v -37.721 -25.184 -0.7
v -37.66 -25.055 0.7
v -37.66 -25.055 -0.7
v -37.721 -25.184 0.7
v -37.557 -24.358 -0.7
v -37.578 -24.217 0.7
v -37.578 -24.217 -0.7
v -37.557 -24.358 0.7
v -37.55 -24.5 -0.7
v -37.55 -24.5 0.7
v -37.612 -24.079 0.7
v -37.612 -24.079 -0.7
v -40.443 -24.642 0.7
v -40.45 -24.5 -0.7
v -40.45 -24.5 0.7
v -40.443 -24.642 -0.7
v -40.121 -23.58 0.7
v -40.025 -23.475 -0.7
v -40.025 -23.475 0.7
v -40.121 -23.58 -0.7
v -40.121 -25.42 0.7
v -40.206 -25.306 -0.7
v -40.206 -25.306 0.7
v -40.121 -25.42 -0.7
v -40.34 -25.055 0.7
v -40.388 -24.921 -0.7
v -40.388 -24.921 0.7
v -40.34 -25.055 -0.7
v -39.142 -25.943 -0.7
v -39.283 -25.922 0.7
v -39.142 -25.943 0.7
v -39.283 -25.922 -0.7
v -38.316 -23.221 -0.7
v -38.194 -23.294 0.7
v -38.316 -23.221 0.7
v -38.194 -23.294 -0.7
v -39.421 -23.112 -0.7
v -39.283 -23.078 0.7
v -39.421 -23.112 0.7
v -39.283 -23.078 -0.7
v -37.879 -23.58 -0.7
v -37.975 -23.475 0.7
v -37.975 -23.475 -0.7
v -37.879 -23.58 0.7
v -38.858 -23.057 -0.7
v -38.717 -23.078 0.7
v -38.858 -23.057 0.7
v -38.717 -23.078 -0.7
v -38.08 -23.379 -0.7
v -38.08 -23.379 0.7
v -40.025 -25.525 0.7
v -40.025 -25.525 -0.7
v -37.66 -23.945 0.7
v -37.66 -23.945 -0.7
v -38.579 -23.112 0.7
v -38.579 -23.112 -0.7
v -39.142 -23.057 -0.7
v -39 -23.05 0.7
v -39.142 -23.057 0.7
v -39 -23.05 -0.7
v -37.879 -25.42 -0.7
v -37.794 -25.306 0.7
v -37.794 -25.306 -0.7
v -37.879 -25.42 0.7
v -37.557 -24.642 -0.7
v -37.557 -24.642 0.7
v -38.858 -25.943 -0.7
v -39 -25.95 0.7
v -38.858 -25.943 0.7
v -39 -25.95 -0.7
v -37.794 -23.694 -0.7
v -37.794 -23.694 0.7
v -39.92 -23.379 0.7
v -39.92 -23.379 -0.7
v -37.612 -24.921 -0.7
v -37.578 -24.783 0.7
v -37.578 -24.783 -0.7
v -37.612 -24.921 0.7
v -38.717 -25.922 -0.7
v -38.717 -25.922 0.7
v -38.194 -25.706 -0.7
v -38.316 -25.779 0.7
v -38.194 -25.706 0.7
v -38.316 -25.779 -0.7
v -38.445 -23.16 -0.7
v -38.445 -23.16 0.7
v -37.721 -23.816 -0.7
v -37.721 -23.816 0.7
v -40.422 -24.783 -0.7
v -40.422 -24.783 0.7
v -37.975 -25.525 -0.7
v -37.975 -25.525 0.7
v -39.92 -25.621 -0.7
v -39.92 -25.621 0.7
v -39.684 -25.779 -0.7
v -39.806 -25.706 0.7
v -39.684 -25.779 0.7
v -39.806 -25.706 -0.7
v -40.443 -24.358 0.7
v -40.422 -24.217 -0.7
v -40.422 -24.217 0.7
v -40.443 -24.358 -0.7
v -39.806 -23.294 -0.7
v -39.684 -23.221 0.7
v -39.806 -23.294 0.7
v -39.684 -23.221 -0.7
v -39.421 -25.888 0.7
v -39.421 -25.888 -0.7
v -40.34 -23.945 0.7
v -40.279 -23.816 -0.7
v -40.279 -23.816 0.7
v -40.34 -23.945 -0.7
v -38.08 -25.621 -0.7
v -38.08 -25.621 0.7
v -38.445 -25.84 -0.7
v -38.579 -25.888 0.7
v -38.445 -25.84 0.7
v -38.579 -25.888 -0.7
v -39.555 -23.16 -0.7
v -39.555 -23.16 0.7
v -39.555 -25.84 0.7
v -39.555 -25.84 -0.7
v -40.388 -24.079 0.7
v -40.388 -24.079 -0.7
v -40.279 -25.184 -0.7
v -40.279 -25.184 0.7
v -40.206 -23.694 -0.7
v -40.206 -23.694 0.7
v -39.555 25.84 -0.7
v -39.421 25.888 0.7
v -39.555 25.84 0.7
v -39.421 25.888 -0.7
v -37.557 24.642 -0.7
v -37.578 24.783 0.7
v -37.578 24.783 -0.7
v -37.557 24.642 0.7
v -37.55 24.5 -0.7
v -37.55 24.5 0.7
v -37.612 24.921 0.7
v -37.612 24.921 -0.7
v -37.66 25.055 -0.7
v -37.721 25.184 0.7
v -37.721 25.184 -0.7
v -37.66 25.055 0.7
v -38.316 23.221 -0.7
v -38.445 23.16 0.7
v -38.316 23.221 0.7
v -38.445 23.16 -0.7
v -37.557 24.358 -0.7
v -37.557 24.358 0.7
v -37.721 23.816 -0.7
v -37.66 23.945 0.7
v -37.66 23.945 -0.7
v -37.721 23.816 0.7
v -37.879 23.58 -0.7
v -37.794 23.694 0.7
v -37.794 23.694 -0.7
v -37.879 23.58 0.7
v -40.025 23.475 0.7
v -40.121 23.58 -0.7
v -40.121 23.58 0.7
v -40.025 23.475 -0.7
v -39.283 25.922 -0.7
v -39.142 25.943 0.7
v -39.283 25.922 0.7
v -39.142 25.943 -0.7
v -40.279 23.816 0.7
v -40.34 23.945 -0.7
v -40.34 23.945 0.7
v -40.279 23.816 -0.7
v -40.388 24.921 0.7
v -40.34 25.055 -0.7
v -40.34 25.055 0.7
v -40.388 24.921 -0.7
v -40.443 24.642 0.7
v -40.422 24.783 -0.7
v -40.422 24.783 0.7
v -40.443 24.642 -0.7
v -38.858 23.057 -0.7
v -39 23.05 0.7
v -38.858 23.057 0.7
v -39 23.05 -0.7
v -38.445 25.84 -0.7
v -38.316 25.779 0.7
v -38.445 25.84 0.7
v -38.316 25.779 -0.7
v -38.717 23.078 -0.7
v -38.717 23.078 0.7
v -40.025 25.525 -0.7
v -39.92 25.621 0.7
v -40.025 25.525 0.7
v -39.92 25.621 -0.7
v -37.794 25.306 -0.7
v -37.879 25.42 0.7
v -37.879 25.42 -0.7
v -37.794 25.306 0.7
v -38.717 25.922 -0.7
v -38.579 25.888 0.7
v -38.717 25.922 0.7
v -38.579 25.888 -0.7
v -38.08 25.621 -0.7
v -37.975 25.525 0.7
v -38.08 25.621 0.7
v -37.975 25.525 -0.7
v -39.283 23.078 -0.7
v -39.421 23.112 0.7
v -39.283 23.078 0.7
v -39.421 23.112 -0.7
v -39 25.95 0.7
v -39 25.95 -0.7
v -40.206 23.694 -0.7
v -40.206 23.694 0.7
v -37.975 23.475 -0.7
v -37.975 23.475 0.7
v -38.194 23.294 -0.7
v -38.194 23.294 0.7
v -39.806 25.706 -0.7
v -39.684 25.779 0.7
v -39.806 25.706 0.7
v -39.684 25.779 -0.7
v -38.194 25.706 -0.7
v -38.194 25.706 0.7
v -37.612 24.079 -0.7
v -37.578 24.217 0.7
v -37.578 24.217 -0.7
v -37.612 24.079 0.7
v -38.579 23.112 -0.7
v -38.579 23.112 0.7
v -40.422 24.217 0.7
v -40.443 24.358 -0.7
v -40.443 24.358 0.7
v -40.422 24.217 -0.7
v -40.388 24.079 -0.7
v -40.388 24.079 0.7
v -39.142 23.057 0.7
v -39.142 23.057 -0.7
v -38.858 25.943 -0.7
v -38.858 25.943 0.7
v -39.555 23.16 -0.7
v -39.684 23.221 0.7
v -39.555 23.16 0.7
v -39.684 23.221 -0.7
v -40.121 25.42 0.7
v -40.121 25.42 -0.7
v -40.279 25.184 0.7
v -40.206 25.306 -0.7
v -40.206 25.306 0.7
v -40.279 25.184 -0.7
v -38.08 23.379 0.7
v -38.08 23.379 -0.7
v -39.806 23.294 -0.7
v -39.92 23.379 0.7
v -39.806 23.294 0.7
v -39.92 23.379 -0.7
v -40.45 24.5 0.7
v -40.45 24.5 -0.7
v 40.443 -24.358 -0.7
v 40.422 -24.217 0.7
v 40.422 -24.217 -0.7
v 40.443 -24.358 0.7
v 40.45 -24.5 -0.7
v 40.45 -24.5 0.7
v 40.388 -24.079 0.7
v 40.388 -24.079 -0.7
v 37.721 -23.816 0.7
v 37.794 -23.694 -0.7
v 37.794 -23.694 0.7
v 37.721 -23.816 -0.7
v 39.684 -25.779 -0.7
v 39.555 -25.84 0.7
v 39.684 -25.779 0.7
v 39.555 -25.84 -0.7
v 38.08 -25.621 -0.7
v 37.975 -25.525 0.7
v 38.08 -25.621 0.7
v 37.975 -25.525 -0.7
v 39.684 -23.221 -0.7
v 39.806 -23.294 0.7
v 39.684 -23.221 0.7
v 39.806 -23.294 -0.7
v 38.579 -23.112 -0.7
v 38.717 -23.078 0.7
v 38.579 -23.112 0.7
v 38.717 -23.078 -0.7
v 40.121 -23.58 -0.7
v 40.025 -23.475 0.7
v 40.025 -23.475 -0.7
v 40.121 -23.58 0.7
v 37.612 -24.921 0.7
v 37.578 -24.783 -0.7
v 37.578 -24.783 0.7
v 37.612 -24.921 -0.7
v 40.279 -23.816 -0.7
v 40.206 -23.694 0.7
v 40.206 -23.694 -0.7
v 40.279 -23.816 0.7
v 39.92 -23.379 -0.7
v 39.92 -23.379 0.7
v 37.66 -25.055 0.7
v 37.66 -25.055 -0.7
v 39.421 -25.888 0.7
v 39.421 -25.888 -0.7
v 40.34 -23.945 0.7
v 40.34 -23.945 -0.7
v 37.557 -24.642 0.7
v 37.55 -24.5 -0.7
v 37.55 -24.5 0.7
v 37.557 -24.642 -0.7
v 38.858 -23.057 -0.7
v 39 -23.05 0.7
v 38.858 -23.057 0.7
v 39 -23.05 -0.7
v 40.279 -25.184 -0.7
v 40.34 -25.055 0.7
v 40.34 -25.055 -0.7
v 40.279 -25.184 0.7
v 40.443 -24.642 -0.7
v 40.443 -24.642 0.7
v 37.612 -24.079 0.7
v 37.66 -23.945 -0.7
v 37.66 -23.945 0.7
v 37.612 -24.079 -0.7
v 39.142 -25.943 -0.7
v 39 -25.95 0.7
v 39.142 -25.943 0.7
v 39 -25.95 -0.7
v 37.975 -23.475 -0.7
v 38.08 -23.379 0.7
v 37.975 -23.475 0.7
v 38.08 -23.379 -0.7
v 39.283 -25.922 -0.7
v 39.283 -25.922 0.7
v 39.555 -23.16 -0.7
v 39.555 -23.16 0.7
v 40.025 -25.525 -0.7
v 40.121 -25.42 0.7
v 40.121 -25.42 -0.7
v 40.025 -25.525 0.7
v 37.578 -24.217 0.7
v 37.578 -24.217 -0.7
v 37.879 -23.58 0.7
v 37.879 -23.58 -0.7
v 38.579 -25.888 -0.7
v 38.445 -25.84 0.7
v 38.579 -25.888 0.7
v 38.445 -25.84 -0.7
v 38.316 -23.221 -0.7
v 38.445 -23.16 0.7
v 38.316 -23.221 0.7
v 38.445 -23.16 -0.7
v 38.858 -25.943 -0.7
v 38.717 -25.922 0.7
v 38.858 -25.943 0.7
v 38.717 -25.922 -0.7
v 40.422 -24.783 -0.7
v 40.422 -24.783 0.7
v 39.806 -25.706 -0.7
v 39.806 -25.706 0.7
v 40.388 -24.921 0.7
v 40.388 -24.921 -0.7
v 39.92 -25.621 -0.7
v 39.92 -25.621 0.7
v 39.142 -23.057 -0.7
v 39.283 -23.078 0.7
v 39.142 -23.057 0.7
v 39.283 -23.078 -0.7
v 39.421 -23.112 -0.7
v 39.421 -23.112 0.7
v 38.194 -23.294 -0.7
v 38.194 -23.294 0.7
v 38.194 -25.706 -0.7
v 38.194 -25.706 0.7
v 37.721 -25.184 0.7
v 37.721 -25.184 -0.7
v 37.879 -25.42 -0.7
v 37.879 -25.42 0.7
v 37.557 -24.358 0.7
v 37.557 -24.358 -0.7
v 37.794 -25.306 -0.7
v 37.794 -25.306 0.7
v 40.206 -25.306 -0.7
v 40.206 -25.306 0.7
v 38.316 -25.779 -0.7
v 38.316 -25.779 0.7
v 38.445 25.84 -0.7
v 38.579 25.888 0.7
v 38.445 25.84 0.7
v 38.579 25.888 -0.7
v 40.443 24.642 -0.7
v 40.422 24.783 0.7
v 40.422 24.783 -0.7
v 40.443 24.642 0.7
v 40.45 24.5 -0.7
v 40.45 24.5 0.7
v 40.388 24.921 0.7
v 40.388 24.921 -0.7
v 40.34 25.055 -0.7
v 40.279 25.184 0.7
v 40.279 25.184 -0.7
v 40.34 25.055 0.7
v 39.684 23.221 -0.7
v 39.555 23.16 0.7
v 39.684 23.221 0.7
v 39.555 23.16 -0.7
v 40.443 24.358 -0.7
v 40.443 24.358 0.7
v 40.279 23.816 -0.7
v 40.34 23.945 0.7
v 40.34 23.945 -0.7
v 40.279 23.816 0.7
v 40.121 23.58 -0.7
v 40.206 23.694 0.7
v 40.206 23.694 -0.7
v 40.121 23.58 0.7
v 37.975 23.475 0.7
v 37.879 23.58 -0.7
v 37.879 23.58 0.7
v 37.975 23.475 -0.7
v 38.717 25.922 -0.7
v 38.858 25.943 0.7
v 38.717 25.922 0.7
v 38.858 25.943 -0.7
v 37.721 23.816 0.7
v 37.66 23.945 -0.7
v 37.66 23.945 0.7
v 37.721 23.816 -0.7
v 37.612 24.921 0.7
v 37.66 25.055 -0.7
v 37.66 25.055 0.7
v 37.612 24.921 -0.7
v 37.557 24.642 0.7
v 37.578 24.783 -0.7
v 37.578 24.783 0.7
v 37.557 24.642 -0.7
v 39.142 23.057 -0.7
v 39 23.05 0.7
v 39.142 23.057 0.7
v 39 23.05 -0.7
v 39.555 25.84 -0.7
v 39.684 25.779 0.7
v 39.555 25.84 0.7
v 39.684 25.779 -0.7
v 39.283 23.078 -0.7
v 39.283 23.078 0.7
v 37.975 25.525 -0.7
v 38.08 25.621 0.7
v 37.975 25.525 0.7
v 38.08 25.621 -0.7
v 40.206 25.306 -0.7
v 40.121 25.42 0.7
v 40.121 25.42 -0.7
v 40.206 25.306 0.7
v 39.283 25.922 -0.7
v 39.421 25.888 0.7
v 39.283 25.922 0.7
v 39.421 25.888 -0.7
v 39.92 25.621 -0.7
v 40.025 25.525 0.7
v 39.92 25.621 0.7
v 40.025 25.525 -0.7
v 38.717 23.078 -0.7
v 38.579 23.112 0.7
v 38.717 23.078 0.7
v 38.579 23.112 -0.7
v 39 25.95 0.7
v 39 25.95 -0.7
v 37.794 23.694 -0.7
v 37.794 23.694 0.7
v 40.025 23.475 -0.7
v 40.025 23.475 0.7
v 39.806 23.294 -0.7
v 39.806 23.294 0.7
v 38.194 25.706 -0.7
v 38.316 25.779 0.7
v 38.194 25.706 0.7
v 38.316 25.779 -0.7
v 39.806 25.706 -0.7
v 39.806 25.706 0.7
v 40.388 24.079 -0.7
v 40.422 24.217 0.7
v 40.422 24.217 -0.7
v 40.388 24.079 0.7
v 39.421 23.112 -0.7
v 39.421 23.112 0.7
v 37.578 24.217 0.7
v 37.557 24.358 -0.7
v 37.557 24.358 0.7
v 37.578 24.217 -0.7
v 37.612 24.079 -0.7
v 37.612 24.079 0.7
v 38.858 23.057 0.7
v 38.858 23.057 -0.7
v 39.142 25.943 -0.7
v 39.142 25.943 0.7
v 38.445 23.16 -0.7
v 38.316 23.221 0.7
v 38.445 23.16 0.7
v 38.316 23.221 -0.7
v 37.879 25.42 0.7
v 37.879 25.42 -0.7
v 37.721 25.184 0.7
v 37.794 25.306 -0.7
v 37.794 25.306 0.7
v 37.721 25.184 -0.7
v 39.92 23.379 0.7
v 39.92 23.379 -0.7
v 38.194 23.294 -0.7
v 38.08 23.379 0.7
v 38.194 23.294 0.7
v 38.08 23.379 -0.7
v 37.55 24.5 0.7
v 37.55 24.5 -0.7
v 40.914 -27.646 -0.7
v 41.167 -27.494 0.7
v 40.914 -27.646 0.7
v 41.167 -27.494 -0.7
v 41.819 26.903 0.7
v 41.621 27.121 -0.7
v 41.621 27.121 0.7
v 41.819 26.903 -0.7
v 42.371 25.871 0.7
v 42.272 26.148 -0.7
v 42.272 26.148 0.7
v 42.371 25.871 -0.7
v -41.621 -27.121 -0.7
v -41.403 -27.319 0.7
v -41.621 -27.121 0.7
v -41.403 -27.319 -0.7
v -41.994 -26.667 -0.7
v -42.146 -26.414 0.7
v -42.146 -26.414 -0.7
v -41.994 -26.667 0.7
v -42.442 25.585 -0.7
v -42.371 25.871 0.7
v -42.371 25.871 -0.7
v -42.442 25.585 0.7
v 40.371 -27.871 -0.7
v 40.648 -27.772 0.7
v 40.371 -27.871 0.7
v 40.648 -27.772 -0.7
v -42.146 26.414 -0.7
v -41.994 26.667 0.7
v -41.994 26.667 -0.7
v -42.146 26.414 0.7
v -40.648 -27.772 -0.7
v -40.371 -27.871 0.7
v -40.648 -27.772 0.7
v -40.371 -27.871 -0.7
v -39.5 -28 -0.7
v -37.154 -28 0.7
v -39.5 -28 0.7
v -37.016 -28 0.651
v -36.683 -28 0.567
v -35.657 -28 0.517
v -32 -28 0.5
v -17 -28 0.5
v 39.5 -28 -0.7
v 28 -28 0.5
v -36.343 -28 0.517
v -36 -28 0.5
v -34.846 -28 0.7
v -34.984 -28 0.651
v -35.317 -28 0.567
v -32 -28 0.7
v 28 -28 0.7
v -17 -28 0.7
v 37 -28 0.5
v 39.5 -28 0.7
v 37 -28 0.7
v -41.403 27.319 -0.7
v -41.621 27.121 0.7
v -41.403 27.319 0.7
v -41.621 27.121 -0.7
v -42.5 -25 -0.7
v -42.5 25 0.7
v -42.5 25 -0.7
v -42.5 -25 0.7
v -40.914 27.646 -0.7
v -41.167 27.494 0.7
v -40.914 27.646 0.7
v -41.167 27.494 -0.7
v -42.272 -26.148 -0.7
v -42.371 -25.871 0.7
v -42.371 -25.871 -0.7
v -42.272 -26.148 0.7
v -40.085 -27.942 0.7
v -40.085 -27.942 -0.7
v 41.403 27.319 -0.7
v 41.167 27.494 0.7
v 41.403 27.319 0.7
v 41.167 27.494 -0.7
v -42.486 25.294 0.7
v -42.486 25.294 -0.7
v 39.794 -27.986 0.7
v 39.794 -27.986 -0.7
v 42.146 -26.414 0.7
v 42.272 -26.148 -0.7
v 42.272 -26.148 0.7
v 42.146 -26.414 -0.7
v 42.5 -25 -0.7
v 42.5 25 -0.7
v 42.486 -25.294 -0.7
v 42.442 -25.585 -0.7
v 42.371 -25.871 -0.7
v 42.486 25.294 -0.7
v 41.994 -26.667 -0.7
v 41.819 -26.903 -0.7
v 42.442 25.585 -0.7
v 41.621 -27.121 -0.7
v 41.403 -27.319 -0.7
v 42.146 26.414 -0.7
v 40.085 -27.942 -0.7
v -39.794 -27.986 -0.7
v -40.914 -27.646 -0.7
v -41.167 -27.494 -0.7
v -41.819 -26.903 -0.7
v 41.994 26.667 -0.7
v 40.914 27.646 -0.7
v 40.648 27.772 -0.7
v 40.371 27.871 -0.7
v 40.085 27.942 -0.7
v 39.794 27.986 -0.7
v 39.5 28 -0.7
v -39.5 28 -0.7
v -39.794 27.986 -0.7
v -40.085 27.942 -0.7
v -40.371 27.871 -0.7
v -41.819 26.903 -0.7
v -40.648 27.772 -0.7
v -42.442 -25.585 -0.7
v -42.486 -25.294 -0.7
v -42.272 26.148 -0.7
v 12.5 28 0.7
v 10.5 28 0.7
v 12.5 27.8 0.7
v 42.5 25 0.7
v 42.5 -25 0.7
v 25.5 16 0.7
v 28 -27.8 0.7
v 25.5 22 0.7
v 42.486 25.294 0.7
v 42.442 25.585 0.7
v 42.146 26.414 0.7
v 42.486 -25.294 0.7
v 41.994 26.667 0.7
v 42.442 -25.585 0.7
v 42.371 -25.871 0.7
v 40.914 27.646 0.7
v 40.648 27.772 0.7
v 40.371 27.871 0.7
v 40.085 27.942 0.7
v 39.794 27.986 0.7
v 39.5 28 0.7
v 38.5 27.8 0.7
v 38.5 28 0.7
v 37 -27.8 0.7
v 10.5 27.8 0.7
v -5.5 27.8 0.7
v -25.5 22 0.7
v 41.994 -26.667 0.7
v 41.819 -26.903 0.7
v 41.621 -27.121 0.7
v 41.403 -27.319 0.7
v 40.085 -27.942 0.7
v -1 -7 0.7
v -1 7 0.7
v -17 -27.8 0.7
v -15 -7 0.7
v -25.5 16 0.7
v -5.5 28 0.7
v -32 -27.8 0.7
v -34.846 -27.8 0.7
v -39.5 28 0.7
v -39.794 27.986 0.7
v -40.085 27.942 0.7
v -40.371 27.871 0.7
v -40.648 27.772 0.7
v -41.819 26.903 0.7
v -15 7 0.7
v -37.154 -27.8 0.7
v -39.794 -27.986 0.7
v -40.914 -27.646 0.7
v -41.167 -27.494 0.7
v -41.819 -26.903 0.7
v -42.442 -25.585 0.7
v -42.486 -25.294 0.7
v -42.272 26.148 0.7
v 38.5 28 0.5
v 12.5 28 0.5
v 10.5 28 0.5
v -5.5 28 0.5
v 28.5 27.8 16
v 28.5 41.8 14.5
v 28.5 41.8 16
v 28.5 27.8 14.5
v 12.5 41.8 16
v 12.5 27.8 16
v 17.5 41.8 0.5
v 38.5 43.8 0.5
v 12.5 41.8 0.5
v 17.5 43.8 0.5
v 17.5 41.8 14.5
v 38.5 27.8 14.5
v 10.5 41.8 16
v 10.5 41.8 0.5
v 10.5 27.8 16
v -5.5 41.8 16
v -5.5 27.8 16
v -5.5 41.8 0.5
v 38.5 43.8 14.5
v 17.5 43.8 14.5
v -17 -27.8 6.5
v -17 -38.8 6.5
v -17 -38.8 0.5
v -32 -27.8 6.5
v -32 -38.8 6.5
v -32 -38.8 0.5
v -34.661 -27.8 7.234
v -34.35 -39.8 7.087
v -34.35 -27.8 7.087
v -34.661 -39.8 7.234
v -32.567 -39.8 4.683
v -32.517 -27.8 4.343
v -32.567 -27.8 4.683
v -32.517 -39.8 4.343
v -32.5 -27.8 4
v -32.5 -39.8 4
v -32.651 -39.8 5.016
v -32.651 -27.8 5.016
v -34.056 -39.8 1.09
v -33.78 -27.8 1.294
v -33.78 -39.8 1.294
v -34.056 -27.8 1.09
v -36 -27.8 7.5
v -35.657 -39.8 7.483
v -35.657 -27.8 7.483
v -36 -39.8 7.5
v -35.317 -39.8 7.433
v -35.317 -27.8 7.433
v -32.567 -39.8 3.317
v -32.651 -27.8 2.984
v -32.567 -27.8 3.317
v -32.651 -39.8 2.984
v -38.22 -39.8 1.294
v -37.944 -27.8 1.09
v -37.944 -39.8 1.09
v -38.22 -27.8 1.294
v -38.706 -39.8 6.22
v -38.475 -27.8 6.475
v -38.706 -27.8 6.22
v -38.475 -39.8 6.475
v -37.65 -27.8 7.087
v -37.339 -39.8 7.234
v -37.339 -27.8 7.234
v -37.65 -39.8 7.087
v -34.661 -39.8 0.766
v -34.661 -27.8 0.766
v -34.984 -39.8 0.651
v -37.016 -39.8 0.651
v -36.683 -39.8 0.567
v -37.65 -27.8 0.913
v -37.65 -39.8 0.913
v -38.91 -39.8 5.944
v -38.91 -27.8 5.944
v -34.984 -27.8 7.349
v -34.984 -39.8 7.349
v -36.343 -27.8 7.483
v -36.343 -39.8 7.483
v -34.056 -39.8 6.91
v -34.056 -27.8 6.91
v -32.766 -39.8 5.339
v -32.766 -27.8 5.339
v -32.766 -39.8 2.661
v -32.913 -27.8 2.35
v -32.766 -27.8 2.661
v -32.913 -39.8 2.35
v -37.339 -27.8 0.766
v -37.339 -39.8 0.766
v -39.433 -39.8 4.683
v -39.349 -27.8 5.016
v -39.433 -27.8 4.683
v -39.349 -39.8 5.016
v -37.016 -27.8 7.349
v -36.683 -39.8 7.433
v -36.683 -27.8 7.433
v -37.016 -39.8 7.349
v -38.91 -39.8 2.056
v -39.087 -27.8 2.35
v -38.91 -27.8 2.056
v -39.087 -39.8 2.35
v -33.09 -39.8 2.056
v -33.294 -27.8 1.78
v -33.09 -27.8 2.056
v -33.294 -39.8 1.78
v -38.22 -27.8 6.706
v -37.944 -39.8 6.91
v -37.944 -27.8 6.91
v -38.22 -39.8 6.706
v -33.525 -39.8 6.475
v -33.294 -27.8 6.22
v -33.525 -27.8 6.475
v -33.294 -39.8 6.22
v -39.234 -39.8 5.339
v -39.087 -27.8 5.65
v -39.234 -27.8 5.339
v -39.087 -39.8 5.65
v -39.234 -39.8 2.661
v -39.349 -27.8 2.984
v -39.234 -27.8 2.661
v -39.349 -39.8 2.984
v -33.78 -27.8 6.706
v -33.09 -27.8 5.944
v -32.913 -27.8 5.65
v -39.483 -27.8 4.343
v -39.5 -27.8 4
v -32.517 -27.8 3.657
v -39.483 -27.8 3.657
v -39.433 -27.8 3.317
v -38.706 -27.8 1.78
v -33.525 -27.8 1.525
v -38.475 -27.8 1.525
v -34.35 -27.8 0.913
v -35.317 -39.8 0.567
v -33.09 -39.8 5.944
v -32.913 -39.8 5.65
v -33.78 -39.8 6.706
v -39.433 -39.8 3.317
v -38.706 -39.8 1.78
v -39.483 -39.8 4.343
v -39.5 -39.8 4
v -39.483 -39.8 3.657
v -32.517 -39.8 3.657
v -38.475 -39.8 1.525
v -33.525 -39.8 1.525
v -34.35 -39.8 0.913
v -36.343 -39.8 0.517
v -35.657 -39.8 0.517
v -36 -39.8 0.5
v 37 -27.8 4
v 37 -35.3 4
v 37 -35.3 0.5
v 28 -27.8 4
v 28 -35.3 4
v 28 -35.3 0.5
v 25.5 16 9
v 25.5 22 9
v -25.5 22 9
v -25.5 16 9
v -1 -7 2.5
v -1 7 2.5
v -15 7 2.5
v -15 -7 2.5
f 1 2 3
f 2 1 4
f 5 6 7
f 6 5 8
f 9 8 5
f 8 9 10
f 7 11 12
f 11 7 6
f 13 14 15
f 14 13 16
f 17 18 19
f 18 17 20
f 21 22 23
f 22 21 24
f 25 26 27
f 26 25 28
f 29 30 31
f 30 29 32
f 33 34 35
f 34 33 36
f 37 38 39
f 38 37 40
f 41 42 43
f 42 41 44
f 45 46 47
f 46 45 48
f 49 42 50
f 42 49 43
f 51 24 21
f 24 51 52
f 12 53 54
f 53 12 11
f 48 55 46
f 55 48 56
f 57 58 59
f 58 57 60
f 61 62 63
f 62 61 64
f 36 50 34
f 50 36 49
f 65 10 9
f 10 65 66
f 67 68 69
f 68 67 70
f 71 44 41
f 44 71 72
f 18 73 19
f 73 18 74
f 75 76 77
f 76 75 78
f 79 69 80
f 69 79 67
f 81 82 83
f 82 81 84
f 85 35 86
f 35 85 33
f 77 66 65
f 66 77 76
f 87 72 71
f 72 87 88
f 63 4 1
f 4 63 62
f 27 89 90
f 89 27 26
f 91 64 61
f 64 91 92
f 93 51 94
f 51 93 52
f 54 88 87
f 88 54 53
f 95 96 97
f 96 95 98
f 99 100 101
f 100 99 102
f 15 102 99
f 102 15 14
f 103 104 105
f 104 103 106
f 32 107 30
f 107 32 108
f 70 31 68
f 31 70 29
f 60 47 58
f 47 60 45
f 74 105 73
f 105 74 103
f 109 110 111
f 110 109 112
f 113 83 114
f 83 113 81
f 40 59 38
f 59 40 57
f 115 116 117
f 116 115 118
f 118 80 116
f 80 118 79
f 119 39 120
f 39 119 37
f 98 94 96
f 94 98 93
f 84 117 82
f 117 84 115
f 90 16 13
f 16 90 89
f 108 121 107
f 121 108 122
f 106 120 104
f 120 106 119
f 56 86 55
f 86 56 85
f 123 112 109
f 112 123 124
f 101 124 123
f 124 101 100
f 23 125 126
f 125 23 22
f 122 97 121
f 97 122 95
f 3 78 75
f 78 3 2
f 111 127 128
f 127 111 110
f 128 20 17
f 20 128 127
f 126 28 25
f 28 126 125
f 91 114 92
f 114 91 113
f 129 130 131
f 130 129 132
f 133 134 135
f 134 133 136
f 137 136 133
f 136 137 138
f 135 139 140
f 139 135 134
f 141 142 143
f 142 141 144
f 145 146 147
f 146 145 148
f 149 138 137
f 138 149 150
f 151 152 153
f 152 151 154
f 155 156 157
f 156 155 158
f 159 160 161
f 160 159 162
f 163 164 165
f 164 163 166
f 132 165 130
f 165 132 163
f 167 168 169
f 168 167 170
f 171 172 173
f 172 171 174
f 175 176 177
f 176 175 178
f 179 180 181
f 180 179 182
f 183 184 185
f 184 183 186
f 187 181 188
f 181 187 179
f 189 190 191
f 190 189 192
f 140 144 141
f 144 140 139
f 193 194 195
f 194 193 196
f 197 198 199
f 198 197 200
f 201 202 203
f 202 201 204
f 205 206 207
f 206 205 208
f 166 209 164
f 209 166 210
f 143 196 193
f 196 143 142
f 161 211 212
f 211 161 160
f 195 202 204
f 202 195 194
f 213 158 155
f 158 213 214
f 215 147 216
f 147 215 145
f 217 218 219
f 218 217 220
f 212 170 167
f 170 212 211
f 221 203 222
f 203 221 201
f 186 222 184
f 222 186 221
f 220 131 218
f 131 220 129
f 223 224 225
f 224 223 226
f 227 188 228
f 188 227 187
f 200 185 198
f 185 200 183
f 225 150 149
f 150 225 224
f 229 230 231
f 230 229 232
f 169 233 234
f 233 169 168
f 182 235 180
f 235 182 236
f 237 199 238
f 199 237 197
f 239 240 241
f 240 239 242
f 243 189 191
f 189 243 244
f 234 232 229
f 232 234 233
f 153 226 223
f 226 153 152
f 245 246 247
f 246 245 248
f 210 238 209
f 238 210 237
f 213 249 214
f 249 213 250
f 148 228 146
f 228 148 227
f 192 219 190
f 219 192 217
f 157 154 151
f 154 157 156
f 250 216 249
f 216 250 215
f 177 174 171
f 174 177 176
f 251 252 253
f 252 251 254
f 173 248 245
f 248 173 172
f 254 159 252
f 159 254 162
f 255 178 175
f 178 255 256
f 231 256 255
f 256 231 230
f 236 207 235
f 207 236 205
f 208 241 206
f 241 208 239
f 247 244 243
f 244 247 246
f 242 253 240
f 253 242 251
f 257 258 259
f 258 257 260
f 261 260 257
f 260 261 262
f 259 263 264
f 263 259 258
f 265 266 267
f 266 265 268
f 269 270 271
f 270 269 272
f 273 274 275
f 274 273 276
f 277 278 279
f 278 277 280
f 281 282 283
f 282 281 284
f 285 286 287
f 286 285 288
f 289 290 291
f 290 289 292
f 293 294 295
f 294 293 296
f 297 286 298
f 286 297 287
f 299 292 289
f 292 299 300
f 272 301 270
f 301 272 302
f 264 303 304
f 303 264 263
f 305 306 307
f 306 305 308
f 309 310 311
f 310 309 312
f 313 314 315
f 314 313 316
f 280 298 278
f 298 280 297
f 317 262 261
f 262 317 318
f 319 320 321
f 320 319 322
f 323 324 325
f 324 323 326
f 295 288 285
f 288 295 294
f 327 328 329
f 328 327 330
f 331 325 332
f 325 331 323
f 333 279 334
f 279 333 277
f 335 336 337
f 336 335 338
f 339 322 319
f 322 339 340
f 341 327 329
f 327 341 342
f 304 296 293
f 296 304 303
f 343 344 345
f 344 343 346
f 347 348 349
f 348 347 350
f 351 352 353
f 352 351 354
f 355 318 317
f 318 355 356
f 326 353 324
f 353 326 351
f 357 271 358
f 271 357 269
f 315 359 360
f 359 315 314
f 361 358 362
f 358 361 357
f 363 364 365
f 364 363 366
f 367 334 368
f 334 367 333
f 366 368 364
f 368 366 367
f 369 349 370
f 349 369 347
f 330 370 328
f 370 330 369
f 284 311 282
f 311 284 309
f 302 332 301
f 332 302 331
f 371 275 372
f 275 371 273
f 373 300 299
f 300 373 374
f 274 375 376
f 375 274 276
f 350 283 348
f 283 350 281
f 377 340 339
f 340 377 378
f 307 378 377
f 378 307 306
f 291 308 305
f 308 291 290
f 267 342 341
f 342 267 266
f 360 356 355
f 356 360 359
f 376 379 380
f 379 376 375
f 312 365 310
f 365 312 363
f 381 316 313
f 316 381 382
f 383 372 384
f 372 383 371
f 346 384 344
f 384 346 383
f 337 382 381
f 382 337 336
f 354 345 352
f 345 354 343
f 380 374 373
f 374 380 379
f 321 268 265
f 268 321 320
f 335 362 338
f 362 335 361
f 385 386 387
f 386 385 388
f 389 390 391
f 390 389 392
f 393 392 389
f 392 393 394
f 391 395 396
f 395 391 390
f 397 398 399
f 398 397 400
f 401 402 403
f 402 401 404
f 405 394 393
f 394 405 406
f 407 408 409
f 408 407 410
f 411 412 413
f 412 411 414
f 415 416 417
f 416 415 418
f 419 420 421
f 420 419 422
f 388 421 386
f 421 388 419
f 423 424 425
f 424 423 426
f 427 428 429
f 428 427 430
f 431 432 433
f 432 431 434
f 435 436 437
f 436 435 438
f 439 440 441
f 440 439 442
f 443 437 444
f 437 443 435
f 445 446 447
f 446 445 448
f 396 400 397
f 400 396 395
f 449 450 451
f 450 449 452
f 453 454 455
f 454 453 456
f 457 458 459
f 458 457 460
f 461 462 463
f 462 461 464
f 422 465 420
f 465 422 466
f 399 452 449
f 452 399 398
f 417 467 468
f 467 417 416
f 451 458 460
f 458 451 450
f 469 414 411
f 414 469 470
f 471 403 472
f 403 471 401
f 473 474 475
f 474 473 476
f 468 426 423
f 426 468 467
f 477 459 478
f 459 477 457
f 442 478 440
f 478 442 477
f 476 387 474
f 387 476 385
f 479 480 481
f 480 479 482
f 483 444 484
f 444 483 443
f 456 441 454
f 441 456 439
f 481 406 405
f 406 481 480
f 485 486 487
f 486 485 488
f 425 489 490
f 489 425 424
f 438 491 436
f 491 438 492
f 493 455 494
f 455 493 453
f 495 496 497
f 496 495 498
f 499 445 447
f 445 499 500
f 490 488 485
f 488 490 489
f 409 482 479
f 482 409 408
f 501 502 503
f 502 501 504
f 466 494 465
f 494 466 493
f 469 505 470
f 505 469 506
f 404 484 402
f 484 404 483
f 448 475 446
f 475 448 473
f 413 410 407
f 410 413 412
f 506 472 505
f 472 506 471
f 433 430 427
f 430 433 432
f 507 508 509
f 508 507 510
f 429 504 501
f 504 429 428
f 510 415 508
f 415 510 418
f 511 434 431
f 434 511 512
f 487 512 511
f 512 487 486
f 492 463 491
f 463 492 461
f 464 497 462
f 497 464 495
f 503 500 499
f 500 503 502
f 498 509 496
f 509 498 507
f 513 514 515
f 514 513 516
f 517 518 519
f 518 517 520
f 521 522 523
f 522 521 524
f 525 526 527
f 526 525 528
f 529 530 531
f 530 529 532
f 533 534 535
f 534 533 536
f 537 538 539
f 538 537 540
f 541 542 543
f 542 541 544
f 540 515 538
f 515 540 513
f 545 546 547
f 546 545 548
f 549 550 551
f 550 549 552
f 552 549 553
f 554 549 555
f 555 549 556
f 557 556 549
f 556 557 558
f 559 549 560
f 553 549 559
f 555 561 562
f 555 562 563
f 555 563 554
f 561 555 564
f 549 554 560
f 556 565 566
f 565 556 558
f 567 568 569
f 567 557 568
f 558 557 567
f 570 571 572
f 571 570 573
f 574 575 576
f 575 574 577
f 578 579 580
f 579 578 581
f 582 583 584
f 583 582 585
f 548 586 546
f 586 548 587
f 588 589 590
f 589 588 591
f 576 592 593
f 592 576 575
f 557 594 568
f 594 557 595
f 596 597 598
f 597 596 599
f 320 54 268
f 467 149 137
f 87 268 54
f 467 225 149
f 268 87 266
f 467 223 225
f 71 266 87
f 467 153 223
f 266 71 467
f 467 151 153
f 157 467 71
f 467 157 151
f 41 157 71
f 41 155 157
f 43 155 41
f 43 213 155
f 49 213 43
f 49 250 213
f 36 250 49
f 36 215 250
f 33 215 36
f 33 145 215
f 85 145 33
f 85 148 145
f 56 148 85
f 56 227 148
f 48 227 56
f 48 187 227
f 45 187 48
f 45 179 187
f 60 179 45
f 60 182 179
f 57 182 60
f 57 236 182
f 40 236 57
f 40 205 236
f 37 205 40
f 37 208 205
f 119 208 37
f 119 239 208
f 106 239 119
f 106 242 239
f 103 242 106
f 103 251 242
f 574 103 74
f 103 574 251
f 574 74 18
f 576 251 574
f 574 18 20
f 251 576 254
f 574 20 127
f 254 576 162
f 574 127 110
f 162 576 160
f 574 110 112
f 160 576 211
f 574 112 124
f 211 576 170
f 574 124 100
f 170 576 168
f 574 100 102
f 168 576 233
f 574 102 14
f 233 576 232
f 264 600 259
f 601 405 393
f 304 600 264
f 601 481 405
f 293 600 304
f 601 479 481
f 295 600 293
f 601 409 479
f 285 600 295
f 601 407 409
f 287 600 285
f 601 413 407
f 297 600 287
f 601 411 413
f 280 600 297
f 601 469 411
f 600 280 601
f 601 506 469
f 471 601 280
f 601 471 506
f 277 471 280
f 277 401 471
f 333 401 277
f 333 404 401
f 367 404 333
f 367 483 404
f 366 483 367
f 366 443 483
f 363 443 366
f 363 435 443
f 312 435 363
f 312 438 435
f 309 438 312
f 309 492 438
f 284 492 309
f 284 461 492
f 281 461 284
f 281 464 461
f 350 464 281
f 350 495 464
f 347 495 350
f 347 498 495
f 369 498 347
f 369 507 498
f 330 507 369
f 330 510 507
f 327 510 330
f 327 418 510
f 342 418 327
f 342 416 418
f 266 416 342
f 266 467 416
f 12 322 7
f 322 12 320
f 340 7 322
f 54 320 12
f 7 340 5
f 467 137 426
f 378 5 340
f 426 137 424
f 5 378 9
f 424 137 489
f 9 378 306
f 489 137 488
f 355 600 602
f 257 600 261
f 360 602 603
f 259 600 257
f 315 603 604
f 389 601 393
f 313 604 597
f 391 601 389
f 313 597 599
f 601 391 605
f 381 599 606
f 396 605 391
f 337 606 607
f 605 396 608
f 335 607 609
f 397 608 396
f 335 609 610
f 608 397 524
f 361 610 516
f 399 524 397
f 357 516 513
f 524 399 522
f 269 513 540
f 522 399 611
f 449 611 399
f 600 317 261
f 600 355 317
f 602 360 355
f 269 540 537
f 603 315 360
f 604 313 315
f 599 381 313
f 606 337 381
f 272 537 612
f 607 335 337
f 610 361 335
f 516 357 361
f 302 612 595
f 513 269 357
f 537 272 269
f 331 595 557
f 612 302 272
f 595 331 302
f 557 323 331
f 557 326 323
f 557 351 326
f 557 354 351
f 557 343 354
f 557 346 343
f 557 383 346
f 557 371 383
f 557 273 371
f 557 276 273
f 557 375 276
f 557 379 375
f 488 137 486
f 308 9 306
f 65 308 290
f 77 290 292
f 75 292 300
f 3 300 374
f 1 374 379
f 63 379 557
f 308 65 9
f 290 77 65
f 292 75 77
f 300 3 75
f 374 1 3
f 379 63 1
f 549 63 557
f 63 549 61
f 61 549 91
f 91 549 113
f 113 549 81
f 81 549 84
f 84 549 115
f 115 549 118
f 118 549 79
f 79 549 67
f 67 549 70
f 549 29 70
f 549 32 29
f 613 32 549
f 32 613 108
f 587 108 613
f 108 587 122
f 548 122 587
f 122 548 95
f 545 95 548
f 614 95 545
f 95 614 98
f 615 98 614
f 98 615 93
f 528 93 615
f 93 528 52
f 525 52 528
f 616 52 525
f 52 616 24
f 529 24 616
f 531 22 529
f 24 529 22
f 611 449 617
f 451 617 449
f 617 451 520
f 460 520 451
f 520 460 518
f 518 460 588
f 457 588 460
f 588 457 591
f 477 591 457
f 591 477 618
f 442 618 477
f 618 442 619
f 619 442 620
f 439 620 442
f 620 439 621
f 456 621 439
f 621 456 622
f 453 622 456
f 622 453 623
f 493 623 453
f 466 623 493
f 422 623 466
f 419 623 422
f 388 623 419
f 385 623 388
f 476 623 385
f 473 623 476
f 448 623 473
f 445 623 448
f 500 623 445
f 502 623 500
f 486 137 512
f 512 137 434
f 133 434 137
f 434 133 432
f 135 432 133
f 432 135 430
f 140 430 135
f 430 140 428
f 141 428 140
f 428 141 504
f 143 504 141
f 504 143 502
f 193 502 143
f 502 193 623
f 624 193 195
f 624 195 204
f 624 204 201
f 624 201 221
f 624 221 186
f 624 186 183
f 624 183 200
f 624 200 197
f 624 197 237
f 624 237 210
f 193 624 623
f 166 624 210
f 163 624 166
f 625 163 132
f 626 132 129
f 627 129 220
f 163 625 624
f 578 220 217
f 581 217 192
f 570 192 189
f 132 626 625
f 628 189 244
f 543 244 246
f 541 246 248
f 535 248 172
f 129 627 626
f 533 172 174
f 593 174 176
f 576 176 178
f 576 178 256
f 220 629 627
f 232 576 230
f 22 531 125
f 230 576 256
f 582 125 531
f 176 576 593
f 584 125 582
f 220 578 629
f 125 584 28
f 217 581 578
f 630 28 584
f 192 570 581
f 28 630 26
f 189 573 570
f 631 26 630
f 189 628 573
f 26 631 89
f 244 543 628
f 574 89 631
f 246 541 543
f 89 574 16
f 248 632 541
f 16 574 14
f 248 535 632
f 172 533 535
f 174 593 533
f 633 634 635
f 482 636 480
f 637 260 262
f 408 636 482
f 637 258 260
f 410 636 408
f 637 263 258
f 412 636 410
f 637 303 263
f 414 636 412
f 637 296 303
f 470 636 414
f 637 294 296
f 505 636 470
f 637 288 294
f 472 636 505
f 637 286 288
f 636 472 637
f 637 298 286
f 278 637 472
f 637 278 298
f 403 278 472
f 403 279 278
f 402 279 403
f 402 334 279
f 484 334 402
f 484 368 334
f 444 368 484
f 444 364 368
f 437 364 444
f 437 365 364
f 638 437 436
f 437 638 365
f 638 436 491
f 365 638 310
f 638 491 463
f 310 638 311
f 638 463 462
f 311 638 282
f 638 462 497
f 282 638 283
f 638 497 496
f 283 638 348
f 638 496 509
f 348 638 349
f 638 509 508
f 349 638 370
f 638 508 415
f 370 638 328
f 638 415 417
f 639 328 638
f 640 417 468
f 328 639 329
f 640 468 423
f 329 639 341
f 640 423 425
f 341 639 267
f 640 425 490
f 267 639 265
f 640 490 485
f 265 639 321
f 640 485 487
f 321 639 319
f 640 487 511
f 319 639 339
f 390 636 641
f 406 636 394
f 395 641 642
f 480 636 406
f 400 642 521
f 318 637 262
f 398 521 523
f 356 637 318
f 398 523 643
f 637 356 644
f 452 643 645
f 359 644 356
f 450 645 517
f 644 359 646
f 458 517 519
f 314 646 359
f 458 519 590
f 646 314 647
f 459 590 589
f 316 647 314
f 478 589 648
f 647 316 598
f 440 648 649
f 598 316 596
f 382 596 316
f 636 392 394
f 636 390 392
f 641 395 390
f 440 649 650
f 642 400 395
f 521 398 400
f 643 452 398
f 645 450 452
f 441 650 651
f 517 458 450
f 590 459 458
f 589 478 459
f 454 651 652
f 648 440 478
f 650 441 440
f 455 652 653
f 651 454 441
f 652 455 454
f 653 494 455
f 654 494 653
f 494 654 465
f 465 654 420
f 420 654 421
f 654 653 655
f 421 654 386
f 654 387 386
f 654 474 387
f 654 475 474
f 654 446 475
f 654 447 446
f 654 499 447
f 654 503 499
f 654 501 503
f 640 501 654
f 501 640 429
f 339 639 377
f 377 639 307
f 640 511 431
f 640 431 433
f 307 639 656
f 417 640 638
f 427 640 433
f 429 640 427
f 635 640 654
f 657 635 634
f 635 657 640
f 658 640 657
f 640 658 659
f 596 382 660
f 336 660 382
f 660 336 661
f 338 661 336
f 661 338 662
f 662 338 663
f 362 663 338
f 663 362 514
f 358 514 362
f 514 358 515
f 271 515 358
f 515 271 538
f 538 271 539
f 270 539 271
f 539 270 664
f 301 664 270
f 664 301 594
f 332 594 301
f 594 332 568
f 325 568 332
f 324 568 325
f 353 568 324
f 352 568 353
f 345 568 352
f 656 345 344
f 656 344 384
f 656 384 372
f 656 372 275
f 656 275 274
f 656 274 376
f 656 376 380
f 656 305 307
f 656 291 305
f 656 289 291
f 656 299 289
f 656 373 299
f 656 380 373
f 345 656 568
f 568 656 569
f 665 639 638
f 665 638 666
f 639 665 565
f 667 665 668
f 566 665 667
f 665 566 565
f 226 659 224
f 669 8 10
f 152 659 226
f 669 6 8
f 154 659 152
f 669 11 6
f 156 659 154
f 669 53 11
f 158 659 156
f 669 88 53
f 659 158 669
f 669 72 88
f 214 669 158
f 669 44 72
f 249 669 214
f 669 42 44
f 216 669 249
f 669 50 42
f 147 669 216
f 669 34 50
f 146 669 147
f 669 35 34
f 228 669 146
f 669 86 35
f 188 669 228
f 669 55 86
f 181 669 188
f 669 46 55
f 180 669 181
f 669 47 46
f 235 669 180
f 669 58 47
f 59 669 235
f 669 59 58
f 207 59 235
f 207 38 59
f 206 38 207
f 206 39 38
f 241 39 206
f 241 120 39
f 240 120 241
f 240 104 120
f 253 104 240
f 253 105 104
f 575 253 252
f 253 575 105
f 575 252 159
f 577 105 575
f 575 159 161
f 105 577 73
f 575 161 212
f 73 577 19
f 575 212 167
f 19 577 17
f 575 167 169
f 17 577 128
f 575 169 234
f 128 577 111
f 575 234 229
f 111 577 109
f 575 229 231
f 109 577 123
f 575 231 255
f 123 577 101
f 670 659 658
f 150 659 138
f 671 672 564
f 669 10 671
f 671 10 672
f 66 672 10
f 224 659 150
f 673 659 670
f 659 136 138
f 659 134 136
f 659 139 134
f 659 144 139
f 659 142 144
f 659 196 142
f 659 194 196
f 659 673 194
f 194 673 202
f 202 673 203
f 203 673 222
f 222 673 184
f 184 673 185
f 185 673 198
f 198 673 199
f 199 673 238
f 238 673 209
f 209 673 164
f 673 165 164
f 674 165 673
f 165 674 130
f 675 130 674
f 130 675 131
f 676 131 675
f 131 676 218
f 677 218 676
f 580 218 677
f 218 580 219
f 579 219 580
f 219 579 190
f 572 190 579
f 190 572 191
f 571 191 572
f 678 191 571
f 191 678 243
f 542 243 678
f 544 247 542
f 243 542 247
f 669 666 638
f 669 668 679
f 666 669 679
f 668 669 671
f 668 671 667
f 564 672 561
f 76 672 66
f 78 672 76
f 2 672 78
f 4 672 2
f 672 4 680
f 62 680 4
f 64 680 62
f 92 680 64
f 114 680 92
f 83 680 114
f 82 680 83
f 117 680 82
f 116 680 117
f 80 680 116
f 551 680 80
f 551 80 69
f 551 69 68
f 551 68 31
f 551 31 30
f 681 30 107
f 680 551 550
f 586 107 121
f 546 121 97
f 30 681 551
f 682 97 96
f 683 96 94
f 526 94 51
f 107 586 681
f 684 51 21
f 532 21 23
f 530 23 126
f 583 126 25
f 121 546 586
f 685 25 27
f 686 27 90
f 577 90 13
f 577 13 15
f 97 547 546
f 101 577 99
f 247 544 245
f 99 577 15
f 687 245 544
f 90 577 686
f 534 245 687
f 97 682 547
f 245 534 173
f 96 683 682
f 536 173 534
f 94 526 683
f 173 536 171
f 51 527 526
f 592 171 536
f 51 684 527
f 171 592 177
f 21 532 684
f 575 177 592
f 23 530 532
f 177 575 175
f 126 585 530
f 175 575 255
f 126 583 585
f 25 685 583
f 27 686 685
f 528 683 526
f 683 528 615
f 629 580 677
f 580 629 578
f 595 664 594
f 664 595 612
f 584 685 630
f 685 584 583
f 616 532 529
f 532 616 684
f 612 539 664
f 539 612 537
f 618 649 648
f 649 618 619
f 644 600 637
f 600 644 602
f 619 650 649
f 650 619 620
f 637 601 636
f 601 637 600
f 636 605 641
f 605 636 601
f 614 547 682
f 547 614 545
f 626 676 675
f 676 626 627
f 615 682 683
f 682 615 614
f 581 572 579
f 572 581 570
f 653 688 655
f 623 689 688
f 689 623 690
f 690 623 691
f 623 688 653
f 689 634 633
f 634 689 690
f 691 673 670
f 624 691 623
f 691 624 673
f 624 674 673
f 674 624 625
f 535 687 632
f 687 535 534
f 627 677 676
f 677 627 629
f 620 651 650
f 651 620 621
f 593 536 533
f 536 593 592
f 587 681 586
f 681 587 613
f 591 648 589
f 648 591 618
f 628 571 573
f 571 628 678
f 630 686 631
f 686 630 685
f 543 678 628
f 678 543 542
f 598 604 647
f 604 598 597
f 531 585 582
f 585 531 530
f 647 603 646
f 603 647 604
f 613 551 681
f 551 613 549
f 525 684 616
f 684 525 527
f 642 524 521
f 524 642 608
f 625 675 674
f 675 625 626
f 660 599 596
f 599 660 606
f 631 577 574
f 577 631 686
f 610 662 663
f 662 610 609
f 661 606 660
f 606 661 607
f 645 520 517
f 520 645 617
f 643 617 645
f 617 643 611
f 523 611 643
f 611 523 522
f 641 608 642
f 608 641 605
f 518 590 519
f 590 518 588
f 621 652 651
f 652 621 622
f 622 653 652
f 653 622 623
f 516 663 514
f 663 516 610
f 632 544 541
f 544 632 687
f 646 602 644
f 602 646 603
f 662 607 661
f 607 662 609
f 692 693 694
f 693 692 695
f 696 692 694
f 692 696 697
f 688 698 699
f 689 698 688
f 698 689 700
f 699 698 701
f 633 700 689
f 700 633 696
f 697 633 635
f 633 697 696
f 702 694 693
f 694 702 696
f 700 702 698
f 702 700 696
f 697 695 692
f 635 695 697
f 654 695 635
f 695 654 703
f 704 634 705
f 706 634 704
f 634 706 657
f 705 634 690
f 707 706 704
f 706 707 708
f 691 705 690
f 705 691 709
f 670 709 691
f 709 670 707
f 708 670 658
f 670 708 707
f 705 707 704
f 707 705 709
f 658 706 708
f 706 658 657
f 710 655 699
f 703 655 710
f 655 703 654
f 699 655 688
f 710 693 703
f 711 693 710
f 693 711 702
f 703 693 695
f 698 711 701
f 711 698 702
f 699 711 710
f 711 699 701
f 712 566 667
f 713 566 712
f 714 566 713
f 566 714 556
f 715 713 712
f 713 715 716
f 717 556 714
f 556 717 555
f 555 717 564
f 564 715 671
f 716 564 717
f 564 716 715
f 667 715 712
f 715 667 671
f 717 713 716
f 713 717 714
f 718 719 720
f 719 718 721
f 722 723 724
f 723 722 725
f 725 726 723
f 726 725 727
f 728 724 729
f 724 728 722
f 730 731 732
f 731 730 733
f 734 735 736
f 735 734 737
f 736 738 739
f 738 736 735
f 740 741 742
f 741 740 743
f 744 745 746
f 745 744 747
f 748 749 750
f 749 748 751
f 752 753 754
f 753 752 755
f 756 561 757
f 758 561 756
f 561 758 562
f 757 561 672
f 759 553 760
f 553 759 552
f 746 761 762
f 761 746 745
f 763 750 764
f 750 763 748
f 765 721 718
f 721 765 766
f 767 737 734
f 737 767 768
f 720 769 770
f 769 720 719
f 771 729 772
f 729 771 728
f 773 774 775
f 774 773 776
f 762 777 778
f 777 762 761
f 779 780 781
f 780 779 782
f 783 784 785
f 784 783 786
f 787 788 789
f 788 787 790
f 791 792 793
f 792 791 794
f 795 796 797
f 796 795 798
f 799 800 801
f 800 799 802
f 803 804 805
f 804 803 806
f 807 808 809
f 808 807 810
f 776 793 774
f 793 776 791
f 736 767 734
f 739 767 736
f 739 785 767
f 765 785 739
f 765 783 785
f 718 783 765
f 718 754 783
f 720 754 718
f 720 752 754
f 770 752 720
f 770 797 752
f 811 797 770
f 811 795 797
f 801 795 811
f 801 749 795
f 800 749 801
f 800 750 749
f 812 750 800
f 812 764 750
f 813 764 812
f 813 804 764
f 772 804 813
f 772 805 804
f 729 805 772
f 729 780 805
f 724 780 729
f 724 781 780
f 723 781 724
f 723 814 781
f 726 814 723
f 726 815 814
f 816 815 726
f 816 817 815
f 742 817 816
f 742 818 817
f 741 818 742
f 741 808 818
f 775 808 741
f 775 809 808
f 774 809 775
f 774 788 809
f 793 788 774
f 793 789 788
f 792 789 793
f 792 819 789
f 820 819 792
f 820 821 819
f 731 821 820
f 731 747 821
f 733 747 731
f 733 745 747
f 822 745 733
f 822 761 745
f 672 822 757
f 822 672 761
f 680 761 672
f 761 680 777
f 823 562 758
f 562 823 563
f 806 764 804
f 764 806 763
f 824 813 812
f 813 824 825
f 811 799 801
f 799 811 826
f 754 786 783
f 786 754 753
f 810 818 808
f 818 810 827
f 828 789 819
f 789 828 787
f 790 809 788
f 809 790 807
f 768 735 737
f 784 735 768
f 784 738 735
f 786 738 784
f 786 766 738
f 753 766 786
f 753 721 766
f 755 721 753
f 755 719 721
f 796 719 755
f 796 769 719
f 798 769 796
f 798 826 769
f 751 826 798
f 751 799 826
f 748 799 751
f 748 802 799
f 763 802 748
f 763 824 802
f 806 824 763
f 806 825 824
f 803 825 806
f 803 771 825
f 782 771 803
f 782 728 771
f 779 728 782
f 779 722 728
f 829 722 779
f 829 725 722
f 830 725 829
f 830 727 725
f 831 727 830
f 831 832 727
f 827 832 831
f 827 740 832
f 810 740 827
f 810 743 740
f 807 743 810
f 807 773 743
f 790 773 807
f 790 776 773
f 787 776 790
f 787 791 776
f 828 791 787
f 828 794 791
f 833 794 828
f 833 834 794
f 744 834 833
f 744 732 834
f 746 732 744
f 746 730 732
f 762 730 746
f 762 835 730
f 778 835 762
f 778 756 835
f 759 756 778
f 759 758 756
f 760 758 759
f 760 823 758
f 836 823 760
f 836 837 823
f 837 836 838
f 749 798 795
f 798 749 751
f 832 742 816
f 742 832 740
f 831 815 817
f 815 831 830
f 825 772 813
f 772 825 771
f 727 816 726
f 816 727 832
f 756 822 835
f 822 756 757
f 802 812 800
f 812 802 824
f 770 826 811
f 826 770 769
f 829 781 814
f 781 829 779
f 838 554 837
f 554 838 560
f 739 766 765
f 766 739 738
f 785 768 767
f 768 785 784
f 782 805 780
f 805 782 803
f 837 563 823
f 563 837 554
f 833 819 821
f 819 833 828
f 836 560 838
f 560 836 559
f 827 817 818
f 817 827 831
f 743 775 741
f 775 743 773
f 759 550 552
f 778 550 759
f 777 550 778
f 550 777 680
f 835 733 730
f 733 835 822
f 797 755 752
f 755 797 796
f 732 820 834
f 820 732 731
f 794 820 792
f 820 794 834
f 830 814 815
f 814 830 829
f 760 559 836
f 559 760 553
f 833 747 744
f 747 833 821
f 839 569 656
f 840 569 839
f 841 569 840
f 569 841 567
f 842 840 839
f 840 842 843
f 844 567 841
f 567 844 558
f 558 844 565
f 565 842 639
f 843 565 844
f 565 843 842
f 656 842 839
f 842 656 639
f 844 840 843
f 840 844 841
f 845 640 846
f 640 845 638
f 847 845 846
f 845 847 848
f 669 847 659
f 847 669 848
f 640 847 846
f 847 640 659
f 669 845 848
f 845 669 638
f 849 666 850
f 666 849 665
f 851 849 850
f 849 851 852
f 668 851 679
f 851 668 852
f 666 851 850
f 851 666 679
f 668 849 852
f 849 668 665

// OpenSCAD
$fn = 64;

// Target PCB dimensions (must match exactly)
pcb_length = 85.0;
pcb_width  = 56.0;
pcb_thickness = 1.4;

// Small overlap to guarantee watertight connectivity between parts
overlap = 0.2;

// ---------- Helpers ----------
module rounded_rect_prism(l, w, h, r) {
    r2 = min(r, min(l, w)/2);
    linear_extrude(height=h, center=true)
        offset(r=r2)
            square([l-2*r2, w-2*r2], center=true);
}

module hole_cyl(r, h) {
    cylinder(r=r, h=h, center=true);
}

// ---------- PCB with mounting holes ----------
module pcb_with_holes() {
    corner_r = 3.0;

    // Typical SBC mounting hole pattern (approx), kept within board
    hole_r = 1.45; // ~2.9mm dia
    hole_edge_x = 3.5;
    hole_edge_y = 3.5;

    hole_x = pcb_length/2 - hole_edge_x;
    hole_y = pcb_width/2  - hole_edge_y;

    difference() {
        color([0.0, 0.4, 0.2])
            rounded_rect_prism(pcb_length, pcb_width, pcb_thickness, corner_r);

        // Cut holes through PCB
        for (sx = [-1, 1], sy = [-1, 1])
            translate([sx*hole_x, sy*hole_y, 0])
                hole_cyl(hole_r, pcb_thickness + 2);
    }
}

// ---------- Components (all connected to PCB) ----------
module usb_stack() {
    // Two stacked USB-A like blocks on one long edge
    usb_w = 16.0;   // along X
    usb_d = 14.0;   // protrusion along +Y
    usb_h = 15.5;   // height above PCB

    // Place centered near one end on +Y edge
    x0 = pcb_length/2 - 22.0;
    y0 = pcb_width/2 + usb_d/2 - overlap;
    z0 = pcb_thickness/2 + usb_h/2 - overlap;

    color([0.75, 0.75, 0.75])
    translate([x0, y0, z0])
        cube([usb_w, usb_d, usb_h], center=true);

    // Second USB next to it
    color([0.75, 0.75, 0.75])
    translate([x0 - (usb_w + 2.0), y0, z0])
        cube([usb_w, usb_d, usb_h], center=true);
}

module ethernet_jack() {
    eth_w = 21.0;  // along X
    eth_d = 16.0;  // protrusion along +Y
    eth_h = 14.0;

    x0 = pcb_length/2 - (eth_w/2 + 4.0);
    y0 = pcb_width/2 + eth_d/2 - overlap;
    z0 = pcb_thickness/2 + eth_h/2 - overlap;

    color([0.65, 0.65, 0.65])
    translate([x0, y0, z0])
        cube([eth_w, eth_d, eth_h], center=true);
}

module hdmi_port() {
    hdmi_w = 15.0; // along X
    hdmi_d = 11.0; // protrusion along -Y
    hdmi_h = 6.0;

    x0 = -pcb_length/2 + 18.0;
    y0 = -pcb_width/2 - hdmi_d/2 + overlap;
    z0 = pcb_thickness/2 + hdmi_h/2 - overlap;

    color([0.55, 0.55, 0.55])
    translate([x0, y0, z0])
        cube([hdmi_w, hdmi_d, hdmi_h], center=true);
}

module audio_jack() {
    jack_r = 3.5;
    jack_len = 12.0; // protrusion along -Y

    x0 = -pcb_length/2 + 6.5;
    y0 = -pcb_width/2 - jack_len/2 + overlap;
    z0 = pcb_thickness/2 + jack_r - overlap;

    color([0.1, 0.1, 0.1])
    translate([x0, y0, z0])
        rotate([90, 0, 0])
            cylinder(r=jack_r, h=jack_len, center=true);
}

module gpio_header() {
    // 2x20 header block
    hdr_w = 51.0; // along X
    hdr_d = 6.0;  // along Y
    hdr_h = 8.5;

    x0 = 0;
    y0 = pcb_width/2 - (hdr_d/2 + 6.0);
    z0 = pcb_thickness/2 + hdr_h/2 - overlap;

    color([0.05, 0.05, 0.05])
    translate([x0, y0, z0])
        cube([hdr_w, hdr_d, hdr_h], center=true);
}

module main_chip() {
    chip_w = 14.0;
    chip_d = 14.0;
    chip_h = 2.0;

    x0 = -8.0;
    y0 = 0.0;
    z0 = pcb_thickness/2 + chip_h/2 - overlap;

    color([0.12, 0.12, 0.12])
    translate([x0, y0, z0])
        cube([chip_w, chip_d, chip_h], center=true);
}

module usb_c_power() {
    // Small USB-C power connector on -Y edge
    c_w = 9.0;   // along X
    c_d = 7.5;   // protrusion along -Y
    c_h = 3.5;

    x0 = pcb_length/2 - 10.0;
    y0 = -pcb_width/2 - c_d/2 + overlap;
    z0 = pcb_thickness/2 + c_h/2 - overlap;

    color([0.6, 0.6, 0.6])
    translate([x0, y0, z0])
        cube([c_w, c_d, c_h], center=true);
}

// ---------- Complete SBC (single connected solid) ----------
module sbc_complete_model() {
    union() {
        pcb_with_holes();

        // Edge connectors (all overlap into PCB by 'overlap')
        ethernet_jack();
        usb_stack();
        hdmi_port();
        audio_jack();
        usb_c_power();

        // On-board components
        gpio_header();
        main_chip();
    }
}

sbc_complete_model();
